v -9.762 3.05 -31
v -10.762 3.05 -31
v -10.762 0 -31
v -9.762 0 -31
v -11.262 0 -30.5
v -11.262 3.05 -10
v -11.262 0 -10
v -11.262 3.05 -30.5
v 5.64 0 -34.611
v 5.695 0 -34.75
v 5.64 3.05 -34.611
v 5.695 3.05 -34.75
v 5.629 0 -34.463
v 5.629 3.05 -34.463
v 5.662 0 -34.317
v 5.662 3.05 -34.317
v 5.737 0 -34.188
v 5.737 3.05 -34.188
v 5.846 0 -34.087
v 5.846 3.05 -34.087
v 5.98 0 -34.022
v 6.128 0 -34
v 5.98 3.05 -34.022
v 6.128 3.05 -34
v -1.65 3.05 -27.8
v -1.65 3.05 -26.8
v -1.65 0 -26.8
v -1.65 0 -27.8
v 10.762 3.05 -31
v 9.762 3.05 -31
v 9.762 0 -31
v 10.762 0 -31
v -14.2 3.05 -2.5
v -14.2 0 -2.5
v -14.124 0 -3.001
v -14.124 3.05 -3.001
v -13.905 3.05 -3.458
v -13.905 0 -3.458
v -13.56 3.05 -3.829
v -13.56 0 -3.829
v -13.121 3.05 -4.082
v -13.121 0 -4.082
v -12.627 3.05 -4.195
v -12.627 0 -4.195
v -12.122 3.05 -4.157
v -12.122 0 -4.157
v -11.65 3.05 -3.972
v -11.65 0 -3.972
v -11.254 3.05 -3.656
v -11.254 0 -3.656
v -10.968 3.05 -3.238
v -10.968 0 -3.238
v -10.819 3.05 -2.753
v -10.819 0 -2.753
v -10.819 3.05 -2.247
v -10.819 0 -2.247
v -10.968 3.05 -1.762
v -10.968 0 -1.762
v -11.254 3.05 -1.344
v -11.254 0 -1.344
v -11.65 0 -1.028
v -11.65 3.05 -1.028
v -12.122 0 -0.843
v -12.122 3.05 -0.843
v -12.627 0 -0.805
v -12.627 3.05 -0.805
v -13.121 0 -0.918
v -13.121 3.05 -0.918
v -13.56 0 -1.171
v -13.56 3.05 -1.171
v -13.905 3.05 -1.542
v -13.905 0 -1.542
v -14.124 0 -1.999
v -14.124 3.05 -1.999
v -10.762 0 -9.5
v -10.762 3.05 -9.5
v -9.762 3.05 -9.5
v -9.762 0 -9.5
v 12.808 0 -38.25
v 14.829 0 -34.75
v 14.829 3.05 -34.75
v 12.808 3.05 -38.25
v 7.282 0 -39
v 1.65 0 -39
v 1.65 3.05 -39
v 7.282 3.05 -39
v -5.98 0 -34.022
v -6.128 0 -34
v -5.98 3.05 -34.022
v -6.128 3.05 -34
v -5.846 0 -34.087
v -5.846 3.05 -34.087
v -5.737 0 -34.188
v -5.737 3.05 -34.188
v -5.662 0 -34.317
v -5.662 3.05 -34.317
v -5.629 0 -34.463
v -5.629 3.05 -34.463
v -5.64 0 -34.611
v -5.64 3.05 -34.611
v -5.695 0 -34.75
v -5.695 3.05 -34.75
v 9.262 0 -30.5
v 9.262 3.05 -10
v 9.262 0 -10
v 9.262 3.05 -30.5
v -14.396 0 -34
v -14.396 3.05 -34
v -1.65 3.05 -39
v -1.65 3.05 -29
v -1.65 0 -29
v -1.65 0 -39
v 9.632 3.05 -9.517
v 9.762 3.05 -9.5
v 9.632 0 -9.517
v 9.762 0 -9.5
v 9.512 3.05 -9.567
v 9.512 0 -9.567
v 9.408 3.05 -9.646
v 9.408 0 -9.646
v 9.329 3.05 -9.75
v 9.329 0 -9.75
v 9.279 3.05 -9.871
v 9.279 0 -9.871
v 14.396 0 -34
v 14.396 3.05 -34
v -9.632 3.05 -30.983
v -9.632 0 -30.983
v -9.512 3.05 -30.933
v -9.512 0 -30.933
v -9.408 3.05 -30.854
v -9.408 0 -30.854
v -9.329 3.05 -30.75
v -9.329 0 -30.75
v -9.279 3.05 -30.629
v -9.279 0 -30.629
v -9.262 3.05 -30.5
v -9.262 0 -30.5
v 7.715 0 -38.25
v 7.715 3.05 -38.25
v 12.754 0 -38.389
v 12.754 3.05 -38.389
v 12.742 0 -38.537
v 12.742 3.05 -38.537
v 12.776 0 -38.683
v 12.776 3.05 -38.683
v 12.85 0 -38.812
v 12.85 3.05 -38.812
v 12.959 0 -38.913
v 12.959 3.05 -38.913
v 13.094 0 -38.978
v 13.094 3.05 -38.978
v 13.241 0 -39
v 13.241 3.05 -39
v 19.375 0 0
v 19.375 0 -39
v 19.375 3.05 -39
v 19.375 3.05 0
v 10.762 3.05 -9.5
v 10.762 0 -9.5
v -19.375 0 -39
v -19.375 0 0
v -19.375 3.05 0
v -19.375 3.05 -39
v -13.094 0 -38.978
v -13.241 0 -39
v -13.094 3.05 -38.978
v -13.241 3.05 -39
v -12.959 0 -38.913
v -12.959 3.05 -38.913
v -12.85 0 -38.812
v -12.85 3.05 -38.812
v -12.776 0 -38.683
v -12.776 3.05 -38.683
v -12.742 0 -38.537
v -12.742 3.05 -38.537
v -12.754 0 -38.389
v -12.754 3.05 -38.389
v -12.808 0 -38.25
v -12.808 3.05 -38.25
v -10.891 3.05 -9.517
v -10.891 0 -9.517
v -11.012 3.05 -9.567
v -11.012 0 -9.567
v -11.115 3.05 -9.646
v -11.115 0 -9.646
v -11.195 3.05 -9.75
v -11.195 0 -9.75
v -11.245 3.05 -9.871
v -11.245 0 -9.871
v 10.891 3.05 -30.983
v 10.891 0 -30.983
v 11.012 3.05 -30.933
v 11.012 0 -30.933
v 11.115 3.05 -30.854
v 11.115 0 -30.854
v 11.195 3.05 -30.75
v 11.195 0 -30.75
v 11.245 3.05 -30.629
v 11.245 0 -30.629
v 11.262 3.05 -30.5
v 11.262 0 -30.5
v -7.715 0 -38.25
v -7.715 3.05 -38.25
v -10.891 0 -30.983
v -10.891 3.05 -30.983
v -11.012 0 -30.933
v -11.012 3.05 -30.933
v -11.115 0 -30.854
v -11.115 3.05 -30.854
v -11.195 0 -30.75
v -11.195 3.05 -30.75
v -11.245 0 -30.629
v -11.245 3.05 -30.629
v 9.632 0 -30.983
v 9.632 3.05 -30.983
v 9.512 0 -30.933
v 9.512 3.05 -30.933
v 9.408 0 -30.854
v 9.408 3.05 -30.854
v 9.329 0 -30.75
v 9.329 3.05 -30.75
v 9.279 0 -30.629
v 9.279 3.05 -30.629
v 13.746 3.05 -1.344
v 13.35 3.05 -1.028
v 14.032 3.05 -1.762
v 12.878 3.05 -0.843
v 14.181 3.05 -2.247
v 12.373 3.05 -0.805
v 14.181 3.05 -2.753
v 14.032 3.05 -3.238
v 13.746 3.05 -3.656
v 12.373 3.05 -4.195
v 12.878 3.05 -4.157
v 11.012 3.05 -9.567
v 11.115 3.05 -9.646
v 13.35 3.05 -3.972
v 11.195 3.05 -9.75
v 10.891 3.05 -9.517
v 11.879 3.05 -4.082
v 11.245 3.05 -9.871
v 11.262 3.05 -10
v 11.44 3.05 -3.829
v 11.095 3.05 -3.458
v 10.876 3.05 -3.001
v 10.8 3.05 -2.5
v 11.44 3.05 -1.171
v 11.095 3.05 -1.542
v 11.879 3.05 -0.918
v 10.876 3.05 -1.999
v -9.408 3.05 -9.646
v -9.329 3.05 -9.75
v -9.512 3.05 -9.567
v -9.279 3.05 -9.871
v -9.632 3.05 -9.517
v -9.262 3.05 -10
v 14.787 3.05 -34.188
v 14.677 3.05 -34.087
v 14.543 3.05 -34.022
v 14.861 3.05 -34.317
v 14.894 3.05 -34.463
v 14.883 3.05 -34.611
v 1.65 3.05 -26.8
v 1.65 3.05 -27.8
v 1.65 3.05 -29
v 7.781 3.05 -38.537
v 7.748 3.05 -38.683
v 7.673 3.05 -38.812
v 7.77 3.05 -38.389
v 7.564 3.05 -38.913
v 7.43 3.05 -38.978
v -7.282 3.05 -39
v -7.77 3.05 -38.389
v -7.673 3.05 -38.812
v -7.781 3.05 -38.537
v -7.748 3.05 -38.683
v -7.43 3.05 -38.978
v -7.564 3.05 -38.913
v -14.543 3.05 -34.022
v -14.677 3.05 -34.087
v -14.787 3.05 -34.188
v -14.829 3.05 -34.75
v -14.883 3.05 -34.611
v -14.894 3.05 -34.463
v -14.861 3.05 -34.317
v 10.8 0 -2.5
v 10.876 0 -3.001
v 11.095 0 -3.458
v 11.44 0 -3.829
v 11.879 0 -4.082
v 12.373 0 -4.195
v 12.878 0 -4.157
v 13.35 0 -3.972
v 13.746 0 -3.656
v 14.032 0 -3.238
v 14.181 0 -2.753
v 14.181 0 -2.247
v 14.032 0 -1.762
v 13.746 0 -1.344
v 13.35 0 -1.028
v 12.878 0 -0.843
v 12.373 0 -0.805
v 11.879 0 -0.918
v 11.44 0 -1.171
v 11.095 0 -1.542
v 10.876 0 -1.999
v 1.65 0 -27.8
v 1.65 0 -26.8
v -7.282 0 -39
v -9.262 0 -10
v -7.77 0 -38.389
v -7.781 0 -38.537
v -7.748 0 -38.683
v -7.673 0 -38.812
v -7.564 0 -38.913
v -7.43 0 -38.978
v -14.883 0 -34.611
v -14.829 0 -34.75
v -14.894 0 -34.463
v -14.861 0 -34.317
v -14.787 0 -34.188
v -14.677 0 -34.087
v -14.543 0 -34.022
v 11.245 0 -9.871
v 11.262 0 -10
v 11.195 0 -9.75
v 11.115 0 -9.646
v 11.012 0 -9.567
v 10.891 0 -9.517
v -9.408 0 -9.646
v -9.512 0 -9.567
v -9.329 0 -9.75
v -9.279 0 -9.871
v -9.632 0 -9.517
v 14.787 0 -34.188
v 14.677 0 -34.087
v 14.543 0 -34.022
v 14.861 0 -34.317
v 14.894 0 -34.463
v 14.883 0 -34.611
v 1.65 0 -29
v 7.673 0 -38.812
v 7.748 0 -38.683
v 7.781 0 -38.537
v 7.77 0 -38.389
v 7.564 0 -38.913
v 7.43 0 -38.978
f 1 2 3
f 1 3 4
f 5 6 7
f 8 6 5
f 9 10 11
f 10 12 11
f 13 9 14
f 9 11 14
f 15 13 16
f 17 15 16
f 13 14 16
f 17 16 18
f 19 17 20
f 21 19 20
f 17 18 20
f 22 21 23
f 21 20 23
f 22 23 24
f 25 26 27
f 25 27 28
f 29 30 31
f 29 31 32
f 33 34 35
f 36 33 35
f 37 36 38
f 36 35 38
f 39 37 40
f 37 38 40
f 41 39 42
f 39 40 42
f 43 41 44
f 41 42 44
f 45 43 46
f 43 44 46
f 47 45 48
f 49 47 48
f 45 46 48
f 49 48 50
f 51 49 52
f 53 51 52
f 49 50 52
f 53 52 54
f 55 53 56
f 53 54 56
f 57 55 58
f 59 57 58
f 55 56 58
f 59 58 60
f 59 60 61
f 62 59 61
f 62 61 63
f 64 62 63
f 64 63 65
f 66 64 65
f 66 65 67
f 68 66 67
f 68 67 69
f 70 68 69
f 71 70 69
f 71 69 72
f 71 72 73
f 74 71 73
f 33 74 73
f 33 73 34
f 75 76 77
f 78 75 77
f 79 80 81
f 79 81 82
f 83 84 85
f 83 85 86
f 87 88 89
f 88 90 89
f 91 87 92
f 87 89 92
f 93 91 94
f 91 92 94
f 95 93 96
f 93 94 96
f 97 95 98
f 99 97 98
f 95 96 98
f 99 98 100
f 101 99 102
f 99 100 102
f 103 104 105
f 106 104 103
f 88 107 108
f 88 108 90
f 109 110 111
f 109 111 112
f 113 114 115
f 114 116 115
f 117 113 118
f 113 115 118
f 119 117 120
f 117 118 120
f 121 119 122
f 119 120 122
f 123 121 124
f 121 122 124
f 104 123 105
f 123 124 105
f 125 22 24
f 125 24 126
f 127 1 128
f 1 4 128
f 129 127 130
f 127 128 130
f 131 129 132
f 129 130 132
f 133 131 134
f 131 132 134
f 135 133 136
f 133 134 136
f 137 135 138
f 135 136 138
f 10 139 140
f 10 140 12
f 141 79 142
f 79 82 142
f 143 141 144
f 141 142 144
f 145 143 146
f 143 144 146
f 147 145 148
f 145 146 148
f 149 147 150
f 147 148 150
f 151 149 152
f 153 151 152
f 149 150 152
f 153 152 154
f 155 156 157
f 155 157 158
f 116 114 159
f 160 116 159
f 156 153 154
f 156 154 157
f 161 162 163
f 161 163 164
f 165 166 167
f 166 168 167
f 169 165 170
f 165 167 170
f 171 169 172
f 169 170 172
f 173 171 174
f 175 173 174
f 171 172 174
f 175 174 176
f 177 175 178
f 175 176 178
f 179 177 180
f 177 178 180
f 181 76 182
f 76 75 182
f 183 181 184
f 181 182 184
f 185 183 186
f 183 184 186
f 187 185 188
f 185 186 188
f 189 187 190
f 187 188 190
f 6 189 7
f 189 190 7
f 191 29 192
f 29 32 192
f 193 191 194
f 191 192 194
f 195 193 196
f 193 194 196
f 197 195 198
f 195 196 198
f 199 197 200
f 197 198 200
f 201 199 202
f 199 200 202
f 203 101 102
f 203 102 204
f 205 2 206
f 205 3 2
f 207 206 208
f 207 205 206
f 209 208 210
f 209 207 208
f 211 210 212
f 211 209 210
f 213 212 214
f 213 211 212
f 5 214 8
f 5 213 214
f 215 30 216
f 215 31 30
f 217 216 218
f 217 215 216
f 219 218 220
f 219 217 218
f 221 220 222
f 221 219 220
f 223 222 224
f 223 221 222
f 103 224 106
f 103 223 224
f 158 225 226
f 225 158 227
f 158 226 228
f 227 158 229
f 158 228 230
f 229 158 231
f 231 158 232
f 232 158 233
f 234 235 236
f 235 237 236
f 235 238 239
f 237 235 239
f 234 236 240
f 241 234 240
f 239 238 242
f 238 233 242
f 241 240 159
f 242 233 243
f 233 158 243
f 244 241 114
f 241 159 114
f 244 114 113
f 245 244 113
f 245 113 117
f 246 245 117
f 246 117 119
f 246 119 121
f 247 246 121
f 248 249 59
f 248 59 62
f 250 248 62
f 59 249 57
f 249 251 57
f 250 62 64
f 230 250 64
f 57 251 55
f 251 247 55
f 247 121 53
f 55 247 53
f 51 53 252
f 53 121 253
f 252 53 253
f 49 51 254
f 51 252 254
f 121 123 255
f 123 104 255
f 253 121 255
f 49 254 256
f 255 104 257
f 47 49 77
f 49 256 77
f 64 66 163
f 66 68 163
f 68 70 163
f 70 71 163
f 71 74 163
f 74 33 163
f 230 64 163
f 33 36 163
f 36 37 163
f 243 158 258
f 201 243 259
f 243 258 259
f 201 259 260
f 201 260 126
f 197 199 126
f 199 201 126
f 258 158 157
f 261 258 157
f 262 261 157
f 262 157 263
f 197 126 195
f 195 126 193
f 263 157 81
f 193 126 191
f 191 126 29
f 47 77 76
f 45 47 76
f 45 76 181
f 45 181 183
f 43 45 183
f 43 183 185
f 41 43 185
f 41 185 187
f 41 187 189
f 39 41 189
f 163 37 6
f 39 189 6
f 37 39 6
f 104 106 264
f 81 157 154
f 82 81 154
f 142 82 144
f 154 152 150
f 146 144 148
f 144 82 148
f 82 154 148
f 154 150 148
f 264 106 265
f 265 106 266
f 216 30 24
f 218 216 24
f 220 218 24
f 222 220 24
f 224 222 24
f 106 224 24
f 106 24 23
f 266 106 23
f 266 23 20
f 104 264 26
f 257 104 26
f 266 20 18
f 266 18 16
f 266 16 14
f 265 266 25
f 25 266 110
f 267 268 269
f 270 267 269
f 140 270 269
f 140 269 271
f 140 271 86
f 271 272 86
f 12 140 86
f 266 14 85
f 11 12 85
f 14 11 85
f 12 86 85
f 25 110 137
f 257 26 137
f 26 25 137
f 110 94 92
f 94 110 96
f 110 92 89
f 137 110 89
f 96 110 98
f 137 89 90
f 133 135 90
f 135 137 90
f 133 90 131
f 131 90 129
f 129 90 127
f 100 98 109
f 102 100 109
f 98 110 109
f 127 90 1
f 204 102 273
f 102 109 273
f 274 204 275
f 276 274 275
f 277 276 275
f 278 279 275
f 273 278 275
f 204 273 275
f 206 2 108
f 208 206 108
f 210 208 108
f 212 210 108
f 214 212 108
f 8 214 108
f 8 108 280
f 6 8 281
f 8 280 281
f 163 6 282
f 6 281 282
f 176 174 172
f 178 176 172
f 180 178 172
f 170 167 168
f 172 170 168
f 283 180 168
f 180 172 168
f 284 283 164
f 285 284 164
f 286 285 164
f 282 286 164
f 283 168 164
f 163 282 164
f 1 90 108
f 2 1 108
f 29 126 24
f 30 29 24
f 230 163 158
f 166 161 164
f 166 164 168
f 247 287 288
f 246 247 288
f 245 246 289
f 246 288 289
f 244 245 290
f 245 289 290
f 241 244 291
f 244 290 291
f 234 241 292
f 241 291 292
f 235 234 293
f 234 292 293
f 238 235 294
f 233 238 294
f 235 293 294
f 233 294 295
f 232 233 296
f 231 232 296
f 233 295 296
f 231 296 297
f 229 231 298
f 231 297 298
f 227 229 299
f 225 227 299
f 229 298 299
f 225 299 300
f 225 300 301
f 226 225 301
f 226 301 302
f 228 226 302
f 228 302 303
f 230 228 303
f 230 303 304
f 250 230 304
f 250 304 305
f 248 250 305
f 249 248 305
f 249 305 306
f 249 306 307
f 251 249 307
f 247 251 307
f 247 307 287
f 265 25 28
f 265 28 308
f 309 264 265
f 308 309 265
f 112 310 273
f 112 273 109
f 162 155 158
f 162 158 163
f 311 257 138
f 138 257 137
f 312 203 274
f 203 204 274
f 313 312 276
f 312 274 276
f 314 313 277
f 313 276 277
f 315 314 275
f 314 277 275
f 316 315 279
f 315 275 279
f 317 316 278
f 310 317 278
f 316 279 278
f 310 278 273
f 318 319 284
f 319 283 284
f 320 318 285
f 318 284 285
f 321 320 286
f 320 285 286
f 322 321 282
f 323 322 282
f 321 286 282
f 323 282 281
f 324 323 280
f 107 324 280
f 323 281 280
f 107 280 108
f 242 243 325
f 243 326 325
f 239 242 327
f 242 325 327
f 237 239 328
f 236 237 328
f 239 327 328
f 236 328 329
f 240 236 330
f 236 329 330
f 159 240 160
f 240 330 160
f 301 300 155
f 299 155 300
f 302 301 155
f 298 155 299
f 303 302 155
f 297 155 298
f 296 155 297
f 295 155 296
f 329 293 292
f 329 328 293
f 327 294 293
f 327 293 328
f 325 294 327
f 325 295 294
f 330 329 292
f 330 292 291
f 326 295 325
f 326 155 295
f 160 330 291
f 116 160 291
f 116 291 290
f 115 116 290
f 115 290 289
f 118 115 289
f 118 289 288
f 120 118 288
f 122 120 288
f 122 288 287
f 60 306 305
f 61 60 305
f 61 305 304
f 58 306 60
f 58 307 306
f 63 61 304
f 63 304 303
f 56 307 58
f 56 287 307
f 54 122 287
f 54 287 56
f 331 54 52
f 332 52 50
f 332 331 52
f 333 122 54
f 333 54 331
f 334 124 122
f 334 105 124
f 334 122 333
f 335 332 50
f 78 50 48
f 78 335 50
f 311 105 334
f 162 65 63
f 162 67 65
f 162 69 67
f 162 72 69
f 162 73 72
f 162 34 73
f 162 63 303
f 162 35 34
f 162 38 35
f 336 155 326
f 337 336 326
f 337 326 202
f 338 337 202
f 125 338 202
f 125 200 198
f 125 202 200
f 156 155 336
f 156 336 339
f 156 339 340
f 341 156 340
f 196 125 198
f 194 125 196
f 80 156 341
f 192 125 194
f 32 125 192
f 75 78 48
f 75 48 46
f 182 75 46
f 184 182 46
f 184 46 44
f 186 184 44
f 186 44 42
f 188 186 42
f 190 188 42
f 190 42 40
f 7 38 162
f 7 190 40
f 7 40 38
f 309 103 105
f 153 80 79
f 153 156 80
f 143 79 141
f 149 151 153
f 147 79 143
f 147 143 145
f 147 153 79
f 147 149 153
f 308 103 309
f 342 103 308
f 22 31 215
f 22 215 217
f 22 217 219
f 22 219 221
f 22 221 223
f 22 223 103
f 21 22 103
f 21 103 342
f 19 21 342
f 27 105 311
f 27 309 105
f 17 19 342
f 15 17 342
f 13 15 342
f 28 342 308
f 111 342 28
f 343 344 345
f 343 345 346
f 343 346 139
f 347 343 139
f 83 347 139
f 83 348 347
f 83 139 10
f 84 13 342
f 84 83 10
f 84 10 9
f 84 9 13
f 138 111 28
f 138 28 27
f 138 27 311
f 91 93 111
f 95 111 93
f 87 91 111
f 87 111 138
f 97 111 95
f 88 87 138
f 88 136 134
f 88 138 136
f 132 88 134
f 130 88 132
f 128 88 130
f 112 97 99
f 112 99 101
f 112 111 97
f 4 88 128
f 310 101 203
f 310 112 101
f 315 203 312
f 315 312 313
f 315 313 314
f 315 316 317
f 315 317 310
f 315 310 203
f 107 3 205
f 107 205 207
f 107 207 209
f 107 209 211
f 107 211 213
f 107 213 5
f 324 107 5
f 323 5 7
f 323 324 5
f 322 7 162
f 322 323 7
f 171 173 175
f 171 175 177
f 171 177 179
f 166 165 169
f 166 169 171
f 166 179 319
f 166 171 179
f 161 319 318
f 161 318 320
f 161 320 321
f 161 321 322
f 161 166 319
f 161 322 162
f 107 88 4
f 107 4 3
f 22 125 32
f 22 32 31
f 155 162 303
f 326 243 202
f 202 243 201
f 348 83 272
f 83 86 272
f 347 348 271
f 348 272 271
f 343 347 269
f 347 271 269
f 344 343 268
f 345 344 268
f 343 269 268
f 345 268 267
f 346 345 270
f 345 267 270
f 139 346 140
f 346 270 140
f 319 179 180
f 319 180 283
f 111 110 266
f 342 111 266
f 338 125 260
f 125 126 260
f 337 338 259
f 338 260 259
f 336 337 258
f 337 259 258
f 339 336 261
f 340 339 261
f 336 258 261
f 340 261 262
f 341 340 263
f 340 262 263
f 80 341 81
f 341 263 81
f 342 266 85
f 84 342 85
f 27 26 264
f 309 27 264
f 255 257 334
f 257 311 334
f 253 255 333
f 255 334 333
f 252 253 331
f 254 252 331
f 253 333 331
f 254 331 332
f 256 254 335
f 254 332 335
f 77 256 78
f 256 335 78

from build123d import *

# Parameters (mm, degrees)
BOSS_EXTRUDE1_DEPTH                = 3.05
FILLET3_R                          = 0.5
SKETCH2_W                          = 3.3
SKETCH2_H                          = 47
SKETCH2_H_2                        = 1
CUT_EXTRUDE1_DEPTH                 = 44.654245212
SKETCH6_W                          = 2
SKETCH6_H                          = 21.5
CUT_EXTRUDE2_DEPTH                 = 44.654245212
FILLET4_R                          = 0.5
M3_CLEARANCE_HEAD_MOUNTING_HOLES_D = 3.4


with BuildPart() as part:
    # Sketch1 → Boss-Extrude1 (new body)
    with BuildSketch(Plane(origin=(0, 0, 0), x_dir=(1, 0, 0), z_dir=(0, 1, 0))):
        Polygon((-19.375, 0), (-19.375, 39), (-12.375, 39), (-15.261751346, 34), (-5.261751346, 34), (-8.148502692, 39), (8.148502692, 39), (5.261751346, 34), (15.261751346, 34), (12.375, 39), (19.375, 39), (19.375, 0), align=None)
    extrude(amount=BOSS_EXTRUDE1_DEPTH)

    # Fillet3
    fillet3_edges = [part.edges().sort_by_distance(p)[0] for p in [
        (-12.375, 1.525, -39),
        (-15.261751346, 1.525, -34),
        (-5.261751346, 1.525, -34),
        (-8.148502692, 1.525, -39),
        (8.148502692, 1.525, -39),
        (5.261751346, 1.525, -34),
        (15.261751346, 1.525, -34),
        (12.375, 1.525, -39),
    ]]
    fillet(fillet3_edges, radius=FILLET3_R)

    # Sketch2 → Cut-Extrude1 (cut, through all)
    with BuildSketch(Plane(origin=(0, 3.05, 0), x_dir=(1, 0, 0), z_dir=(0, 1, 0))):
        with Locations((0, 52.5)):
            Rectangle(SKETCH2_W, SKETCH2_H)
        with Locations((0, 27.3)):
            Rectangle(SKETCH2_W, SKETCH2_H_2)
    extrude(amount=-CUT_EXTRUDE1_DEPTH, mode=Mode.SUBTRACT)

    # Sketch6 → Cut-Extrude2 (cut, through all)
    with BuildSketch(Plane(origin=(0, 3.05, 0), x_dir=(1, 0, 0), z_dir=(0, 1, 0))):
        with Locations((-10.261751346, 20.25)):
            Rectangle(SKETCH6_W, SKETCH6_H)
        with Locations((10.261751346, 20.25)):
            Rectangle(SKETCH6_W, SKETCH6_H)
    extrude(amount=-CUT_EXTRUDE2_DEPTH, mode=Mode.SUBTRACT)

    # Fillet4
    fillet4_edges = [part.edges().sort_by_distance(p)[0] for p in [
        (-11.261751346, 1.525, -9.5),
        (-11.261751346, 1.525, -31),
        (-9.261751346, 1.525, -31),
        (-9.261751346, 1.525, -9.5),
        (11.261751346, 1.525, -31),
        (11.261751346, 1.525, -9.5),
        (9.261751346, 1.525, -9.5),
        (9.261751346, 1.525, -31),
    ]]
    fillet(fillet4_edges, radius=FILLET4_R)

    # M3 Clearance Head Mounting Holes (through all)
    with Locations(Plane(origin=(0, 3.05, 0), x_dir=(1, 0, 0), z_dir=(0, 1, 0))):
        with Locations((-12.5, 2.5), (12.5, 2.5)):
            Hole(M3_CLEARANCE_HEAD_MOUNTING_HOLES_D / 2)


solid = part.part
